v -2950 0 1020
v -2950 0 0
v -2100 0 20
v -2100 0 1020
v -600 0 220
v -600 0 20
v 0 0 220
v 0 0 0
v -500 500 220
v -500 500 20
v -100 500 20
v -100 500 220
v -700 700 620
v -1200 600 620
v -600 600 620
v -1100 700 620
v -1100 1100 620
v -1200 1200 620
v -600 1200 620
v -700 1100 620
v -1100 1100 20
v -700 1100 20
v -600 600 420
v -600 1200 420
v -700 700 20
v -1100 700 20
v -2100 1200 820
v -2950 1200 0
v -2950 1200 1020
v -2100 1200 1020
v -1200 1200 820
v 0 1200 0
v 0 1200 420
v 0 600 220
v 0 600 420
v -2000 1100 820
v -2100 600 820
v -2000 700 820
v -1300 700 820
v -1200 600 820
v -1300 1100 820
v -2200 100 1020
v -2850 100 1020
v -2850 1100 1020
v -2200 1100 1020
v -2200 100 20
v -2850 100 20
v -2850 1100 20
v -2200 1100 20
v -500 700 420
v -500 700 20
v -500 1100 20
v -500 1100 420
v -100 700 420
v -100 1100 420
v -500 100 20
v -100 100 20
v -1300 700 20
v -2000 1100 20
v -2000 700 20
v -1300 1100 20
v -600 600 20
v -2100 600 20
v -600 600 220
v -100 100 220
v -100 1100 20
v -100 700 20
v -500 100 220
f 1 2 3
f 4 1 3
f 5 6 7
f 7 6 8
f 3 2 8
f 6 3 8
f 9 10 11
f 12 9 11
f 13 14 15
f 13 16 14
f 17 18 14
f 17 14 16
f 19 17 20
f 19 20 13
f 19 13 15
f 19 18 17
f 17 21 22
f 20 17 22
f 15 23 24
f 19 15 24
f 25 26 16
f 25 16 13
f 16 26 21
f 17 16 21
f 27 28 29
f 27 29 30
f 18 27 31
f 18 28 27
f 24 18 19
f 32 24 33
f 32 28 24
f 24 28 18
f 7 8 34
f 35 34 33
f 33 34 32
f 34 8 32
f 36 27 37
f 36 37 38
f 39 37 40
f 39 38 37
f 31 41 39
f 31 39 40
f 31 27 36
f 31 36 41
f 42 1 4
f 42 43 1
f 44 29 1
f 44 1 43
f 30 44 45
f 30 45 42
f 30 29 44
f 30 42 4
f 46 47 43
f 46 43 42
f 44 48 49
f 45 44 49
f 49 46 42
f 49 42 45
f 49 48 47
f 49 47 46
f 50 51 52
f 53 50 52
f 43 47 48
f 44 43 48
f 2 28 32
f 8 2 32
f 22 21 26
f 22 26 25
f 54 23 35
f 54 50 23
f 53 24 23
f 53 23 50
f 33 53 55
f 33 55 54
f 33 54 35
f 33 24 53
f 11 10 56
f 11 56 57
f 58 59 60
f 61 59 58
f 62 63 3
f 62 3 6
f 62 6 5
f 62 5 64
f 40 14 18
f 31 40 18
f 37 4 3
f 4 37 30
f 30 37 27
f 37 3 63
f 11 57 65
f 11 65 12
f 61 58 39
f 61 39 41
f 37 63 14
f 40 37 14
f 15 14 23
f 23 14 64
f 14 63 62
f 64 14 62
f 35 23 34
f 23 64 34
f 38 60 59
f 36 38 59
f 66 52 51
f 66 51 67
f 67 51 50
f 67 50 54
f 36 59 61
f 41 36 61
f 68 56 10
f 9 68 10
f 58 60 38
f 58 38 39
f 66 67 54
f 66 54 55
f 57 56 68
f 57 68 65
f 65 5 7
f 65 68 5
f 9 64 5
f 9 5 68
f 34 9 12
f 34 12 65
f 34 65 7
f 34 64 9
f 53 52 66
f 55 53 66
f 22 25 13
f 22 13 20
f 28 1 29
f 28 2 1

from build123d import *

# Parameters (mm, degrees)
F1_DEPTH  = 20
F2_W      = 600
F2_H      = 600
F2_W_2    = 400
F2_H_2    = 400
F3_DEPTH  = 400
F4_W      = 600
F4_H      = 600
F4_W_2    = 400
F4_H_2    = 400
F5_DEPTH  = 600
F6_W      = 900
F6_H      = 600
F6_W_2    = 700
F6_H_2    = 400
F7_DEPTH  = 800
F8_W      = 850
F8_H      = 1200
F8_W_2    = 650
F8_H_2    = 1000
F9_DEPTH  = 1000
F10_W     = 600
F10_H     = 600
F10_W_2   = 400
F10_H_2   = 400
F11_DEPTH = 200


with BuildPart() as f1:
    # F0 (on Top) → F1 (new body)
    with BuildSketch(Plane.XY):
        Polygon((-2563.636364, 0), (0, 0), (0, 1200), (-2950, 1200), (-2950, 0), align=None)
    extrude(amount=F1_DEPTH)

    # F2 (on face) → F3 (join)
    with BuildSketch(Plane.XY.offset(20)):
        with Locations((-300, 900)):
            Rectangle(F2_W, F2_H)
        with Locations((-300, 900)):
            Rectangle(F2_W_2, F2_H_2, mode=Mode.SUBTRACT)
    extrude(amount=F3_DEPTH)

    # F4 (on face) → F5 (join)
    with BuildSketch(Plane.XY.offset(20)):
        with Locations((-900, 900)):
            Rectangle(F4_W, F4_H)
        with Locations((-900, 900)):
            Rectangle(F4_W_2, F4_H_2, mode=Mode.SUBTRACT)
    extrude(amount=F5_DEPTH)

    # F6 (on face) → F7 (join)
    with BuildSketch(Plane.XY.offset(20)):
        with Locations((-1650, 900)):
            Rectangle(F6_W, F6_H)
        with Locations((-1650, 900)):
            Rectangle(F6_W_2, F6_H_2, mode=Mode.SUBTRACT)
    extrude(amount=F7_DEPTH)

    # F8 (on face) → F9 (join)
    with BuildSketch(Plane.XY.offset(20)):
        with Locations((-2525, 600)):
            Rectangle(F8_W, F8_H)
        with Locations((-2525, 600)):
            Rectangle(F8_W_2, F8_H_2, mode=Mode.SUBTRACT)
    extrude(amount=F9_DEPTH)

    # F10 (on face) → F11 (join)
    with BuildSketch(Plane.XY.offset(20)):
        with Locations((-300, 300)):
            Rectangle(F10_W, F10_H)
        with Locations((-300, 300)):
            Rectangle(F10_W_2, F10_H_2, mode=Mode.SUBTRACT)
    extrude(amount=F11_DEPTH)


solid = f1.part
